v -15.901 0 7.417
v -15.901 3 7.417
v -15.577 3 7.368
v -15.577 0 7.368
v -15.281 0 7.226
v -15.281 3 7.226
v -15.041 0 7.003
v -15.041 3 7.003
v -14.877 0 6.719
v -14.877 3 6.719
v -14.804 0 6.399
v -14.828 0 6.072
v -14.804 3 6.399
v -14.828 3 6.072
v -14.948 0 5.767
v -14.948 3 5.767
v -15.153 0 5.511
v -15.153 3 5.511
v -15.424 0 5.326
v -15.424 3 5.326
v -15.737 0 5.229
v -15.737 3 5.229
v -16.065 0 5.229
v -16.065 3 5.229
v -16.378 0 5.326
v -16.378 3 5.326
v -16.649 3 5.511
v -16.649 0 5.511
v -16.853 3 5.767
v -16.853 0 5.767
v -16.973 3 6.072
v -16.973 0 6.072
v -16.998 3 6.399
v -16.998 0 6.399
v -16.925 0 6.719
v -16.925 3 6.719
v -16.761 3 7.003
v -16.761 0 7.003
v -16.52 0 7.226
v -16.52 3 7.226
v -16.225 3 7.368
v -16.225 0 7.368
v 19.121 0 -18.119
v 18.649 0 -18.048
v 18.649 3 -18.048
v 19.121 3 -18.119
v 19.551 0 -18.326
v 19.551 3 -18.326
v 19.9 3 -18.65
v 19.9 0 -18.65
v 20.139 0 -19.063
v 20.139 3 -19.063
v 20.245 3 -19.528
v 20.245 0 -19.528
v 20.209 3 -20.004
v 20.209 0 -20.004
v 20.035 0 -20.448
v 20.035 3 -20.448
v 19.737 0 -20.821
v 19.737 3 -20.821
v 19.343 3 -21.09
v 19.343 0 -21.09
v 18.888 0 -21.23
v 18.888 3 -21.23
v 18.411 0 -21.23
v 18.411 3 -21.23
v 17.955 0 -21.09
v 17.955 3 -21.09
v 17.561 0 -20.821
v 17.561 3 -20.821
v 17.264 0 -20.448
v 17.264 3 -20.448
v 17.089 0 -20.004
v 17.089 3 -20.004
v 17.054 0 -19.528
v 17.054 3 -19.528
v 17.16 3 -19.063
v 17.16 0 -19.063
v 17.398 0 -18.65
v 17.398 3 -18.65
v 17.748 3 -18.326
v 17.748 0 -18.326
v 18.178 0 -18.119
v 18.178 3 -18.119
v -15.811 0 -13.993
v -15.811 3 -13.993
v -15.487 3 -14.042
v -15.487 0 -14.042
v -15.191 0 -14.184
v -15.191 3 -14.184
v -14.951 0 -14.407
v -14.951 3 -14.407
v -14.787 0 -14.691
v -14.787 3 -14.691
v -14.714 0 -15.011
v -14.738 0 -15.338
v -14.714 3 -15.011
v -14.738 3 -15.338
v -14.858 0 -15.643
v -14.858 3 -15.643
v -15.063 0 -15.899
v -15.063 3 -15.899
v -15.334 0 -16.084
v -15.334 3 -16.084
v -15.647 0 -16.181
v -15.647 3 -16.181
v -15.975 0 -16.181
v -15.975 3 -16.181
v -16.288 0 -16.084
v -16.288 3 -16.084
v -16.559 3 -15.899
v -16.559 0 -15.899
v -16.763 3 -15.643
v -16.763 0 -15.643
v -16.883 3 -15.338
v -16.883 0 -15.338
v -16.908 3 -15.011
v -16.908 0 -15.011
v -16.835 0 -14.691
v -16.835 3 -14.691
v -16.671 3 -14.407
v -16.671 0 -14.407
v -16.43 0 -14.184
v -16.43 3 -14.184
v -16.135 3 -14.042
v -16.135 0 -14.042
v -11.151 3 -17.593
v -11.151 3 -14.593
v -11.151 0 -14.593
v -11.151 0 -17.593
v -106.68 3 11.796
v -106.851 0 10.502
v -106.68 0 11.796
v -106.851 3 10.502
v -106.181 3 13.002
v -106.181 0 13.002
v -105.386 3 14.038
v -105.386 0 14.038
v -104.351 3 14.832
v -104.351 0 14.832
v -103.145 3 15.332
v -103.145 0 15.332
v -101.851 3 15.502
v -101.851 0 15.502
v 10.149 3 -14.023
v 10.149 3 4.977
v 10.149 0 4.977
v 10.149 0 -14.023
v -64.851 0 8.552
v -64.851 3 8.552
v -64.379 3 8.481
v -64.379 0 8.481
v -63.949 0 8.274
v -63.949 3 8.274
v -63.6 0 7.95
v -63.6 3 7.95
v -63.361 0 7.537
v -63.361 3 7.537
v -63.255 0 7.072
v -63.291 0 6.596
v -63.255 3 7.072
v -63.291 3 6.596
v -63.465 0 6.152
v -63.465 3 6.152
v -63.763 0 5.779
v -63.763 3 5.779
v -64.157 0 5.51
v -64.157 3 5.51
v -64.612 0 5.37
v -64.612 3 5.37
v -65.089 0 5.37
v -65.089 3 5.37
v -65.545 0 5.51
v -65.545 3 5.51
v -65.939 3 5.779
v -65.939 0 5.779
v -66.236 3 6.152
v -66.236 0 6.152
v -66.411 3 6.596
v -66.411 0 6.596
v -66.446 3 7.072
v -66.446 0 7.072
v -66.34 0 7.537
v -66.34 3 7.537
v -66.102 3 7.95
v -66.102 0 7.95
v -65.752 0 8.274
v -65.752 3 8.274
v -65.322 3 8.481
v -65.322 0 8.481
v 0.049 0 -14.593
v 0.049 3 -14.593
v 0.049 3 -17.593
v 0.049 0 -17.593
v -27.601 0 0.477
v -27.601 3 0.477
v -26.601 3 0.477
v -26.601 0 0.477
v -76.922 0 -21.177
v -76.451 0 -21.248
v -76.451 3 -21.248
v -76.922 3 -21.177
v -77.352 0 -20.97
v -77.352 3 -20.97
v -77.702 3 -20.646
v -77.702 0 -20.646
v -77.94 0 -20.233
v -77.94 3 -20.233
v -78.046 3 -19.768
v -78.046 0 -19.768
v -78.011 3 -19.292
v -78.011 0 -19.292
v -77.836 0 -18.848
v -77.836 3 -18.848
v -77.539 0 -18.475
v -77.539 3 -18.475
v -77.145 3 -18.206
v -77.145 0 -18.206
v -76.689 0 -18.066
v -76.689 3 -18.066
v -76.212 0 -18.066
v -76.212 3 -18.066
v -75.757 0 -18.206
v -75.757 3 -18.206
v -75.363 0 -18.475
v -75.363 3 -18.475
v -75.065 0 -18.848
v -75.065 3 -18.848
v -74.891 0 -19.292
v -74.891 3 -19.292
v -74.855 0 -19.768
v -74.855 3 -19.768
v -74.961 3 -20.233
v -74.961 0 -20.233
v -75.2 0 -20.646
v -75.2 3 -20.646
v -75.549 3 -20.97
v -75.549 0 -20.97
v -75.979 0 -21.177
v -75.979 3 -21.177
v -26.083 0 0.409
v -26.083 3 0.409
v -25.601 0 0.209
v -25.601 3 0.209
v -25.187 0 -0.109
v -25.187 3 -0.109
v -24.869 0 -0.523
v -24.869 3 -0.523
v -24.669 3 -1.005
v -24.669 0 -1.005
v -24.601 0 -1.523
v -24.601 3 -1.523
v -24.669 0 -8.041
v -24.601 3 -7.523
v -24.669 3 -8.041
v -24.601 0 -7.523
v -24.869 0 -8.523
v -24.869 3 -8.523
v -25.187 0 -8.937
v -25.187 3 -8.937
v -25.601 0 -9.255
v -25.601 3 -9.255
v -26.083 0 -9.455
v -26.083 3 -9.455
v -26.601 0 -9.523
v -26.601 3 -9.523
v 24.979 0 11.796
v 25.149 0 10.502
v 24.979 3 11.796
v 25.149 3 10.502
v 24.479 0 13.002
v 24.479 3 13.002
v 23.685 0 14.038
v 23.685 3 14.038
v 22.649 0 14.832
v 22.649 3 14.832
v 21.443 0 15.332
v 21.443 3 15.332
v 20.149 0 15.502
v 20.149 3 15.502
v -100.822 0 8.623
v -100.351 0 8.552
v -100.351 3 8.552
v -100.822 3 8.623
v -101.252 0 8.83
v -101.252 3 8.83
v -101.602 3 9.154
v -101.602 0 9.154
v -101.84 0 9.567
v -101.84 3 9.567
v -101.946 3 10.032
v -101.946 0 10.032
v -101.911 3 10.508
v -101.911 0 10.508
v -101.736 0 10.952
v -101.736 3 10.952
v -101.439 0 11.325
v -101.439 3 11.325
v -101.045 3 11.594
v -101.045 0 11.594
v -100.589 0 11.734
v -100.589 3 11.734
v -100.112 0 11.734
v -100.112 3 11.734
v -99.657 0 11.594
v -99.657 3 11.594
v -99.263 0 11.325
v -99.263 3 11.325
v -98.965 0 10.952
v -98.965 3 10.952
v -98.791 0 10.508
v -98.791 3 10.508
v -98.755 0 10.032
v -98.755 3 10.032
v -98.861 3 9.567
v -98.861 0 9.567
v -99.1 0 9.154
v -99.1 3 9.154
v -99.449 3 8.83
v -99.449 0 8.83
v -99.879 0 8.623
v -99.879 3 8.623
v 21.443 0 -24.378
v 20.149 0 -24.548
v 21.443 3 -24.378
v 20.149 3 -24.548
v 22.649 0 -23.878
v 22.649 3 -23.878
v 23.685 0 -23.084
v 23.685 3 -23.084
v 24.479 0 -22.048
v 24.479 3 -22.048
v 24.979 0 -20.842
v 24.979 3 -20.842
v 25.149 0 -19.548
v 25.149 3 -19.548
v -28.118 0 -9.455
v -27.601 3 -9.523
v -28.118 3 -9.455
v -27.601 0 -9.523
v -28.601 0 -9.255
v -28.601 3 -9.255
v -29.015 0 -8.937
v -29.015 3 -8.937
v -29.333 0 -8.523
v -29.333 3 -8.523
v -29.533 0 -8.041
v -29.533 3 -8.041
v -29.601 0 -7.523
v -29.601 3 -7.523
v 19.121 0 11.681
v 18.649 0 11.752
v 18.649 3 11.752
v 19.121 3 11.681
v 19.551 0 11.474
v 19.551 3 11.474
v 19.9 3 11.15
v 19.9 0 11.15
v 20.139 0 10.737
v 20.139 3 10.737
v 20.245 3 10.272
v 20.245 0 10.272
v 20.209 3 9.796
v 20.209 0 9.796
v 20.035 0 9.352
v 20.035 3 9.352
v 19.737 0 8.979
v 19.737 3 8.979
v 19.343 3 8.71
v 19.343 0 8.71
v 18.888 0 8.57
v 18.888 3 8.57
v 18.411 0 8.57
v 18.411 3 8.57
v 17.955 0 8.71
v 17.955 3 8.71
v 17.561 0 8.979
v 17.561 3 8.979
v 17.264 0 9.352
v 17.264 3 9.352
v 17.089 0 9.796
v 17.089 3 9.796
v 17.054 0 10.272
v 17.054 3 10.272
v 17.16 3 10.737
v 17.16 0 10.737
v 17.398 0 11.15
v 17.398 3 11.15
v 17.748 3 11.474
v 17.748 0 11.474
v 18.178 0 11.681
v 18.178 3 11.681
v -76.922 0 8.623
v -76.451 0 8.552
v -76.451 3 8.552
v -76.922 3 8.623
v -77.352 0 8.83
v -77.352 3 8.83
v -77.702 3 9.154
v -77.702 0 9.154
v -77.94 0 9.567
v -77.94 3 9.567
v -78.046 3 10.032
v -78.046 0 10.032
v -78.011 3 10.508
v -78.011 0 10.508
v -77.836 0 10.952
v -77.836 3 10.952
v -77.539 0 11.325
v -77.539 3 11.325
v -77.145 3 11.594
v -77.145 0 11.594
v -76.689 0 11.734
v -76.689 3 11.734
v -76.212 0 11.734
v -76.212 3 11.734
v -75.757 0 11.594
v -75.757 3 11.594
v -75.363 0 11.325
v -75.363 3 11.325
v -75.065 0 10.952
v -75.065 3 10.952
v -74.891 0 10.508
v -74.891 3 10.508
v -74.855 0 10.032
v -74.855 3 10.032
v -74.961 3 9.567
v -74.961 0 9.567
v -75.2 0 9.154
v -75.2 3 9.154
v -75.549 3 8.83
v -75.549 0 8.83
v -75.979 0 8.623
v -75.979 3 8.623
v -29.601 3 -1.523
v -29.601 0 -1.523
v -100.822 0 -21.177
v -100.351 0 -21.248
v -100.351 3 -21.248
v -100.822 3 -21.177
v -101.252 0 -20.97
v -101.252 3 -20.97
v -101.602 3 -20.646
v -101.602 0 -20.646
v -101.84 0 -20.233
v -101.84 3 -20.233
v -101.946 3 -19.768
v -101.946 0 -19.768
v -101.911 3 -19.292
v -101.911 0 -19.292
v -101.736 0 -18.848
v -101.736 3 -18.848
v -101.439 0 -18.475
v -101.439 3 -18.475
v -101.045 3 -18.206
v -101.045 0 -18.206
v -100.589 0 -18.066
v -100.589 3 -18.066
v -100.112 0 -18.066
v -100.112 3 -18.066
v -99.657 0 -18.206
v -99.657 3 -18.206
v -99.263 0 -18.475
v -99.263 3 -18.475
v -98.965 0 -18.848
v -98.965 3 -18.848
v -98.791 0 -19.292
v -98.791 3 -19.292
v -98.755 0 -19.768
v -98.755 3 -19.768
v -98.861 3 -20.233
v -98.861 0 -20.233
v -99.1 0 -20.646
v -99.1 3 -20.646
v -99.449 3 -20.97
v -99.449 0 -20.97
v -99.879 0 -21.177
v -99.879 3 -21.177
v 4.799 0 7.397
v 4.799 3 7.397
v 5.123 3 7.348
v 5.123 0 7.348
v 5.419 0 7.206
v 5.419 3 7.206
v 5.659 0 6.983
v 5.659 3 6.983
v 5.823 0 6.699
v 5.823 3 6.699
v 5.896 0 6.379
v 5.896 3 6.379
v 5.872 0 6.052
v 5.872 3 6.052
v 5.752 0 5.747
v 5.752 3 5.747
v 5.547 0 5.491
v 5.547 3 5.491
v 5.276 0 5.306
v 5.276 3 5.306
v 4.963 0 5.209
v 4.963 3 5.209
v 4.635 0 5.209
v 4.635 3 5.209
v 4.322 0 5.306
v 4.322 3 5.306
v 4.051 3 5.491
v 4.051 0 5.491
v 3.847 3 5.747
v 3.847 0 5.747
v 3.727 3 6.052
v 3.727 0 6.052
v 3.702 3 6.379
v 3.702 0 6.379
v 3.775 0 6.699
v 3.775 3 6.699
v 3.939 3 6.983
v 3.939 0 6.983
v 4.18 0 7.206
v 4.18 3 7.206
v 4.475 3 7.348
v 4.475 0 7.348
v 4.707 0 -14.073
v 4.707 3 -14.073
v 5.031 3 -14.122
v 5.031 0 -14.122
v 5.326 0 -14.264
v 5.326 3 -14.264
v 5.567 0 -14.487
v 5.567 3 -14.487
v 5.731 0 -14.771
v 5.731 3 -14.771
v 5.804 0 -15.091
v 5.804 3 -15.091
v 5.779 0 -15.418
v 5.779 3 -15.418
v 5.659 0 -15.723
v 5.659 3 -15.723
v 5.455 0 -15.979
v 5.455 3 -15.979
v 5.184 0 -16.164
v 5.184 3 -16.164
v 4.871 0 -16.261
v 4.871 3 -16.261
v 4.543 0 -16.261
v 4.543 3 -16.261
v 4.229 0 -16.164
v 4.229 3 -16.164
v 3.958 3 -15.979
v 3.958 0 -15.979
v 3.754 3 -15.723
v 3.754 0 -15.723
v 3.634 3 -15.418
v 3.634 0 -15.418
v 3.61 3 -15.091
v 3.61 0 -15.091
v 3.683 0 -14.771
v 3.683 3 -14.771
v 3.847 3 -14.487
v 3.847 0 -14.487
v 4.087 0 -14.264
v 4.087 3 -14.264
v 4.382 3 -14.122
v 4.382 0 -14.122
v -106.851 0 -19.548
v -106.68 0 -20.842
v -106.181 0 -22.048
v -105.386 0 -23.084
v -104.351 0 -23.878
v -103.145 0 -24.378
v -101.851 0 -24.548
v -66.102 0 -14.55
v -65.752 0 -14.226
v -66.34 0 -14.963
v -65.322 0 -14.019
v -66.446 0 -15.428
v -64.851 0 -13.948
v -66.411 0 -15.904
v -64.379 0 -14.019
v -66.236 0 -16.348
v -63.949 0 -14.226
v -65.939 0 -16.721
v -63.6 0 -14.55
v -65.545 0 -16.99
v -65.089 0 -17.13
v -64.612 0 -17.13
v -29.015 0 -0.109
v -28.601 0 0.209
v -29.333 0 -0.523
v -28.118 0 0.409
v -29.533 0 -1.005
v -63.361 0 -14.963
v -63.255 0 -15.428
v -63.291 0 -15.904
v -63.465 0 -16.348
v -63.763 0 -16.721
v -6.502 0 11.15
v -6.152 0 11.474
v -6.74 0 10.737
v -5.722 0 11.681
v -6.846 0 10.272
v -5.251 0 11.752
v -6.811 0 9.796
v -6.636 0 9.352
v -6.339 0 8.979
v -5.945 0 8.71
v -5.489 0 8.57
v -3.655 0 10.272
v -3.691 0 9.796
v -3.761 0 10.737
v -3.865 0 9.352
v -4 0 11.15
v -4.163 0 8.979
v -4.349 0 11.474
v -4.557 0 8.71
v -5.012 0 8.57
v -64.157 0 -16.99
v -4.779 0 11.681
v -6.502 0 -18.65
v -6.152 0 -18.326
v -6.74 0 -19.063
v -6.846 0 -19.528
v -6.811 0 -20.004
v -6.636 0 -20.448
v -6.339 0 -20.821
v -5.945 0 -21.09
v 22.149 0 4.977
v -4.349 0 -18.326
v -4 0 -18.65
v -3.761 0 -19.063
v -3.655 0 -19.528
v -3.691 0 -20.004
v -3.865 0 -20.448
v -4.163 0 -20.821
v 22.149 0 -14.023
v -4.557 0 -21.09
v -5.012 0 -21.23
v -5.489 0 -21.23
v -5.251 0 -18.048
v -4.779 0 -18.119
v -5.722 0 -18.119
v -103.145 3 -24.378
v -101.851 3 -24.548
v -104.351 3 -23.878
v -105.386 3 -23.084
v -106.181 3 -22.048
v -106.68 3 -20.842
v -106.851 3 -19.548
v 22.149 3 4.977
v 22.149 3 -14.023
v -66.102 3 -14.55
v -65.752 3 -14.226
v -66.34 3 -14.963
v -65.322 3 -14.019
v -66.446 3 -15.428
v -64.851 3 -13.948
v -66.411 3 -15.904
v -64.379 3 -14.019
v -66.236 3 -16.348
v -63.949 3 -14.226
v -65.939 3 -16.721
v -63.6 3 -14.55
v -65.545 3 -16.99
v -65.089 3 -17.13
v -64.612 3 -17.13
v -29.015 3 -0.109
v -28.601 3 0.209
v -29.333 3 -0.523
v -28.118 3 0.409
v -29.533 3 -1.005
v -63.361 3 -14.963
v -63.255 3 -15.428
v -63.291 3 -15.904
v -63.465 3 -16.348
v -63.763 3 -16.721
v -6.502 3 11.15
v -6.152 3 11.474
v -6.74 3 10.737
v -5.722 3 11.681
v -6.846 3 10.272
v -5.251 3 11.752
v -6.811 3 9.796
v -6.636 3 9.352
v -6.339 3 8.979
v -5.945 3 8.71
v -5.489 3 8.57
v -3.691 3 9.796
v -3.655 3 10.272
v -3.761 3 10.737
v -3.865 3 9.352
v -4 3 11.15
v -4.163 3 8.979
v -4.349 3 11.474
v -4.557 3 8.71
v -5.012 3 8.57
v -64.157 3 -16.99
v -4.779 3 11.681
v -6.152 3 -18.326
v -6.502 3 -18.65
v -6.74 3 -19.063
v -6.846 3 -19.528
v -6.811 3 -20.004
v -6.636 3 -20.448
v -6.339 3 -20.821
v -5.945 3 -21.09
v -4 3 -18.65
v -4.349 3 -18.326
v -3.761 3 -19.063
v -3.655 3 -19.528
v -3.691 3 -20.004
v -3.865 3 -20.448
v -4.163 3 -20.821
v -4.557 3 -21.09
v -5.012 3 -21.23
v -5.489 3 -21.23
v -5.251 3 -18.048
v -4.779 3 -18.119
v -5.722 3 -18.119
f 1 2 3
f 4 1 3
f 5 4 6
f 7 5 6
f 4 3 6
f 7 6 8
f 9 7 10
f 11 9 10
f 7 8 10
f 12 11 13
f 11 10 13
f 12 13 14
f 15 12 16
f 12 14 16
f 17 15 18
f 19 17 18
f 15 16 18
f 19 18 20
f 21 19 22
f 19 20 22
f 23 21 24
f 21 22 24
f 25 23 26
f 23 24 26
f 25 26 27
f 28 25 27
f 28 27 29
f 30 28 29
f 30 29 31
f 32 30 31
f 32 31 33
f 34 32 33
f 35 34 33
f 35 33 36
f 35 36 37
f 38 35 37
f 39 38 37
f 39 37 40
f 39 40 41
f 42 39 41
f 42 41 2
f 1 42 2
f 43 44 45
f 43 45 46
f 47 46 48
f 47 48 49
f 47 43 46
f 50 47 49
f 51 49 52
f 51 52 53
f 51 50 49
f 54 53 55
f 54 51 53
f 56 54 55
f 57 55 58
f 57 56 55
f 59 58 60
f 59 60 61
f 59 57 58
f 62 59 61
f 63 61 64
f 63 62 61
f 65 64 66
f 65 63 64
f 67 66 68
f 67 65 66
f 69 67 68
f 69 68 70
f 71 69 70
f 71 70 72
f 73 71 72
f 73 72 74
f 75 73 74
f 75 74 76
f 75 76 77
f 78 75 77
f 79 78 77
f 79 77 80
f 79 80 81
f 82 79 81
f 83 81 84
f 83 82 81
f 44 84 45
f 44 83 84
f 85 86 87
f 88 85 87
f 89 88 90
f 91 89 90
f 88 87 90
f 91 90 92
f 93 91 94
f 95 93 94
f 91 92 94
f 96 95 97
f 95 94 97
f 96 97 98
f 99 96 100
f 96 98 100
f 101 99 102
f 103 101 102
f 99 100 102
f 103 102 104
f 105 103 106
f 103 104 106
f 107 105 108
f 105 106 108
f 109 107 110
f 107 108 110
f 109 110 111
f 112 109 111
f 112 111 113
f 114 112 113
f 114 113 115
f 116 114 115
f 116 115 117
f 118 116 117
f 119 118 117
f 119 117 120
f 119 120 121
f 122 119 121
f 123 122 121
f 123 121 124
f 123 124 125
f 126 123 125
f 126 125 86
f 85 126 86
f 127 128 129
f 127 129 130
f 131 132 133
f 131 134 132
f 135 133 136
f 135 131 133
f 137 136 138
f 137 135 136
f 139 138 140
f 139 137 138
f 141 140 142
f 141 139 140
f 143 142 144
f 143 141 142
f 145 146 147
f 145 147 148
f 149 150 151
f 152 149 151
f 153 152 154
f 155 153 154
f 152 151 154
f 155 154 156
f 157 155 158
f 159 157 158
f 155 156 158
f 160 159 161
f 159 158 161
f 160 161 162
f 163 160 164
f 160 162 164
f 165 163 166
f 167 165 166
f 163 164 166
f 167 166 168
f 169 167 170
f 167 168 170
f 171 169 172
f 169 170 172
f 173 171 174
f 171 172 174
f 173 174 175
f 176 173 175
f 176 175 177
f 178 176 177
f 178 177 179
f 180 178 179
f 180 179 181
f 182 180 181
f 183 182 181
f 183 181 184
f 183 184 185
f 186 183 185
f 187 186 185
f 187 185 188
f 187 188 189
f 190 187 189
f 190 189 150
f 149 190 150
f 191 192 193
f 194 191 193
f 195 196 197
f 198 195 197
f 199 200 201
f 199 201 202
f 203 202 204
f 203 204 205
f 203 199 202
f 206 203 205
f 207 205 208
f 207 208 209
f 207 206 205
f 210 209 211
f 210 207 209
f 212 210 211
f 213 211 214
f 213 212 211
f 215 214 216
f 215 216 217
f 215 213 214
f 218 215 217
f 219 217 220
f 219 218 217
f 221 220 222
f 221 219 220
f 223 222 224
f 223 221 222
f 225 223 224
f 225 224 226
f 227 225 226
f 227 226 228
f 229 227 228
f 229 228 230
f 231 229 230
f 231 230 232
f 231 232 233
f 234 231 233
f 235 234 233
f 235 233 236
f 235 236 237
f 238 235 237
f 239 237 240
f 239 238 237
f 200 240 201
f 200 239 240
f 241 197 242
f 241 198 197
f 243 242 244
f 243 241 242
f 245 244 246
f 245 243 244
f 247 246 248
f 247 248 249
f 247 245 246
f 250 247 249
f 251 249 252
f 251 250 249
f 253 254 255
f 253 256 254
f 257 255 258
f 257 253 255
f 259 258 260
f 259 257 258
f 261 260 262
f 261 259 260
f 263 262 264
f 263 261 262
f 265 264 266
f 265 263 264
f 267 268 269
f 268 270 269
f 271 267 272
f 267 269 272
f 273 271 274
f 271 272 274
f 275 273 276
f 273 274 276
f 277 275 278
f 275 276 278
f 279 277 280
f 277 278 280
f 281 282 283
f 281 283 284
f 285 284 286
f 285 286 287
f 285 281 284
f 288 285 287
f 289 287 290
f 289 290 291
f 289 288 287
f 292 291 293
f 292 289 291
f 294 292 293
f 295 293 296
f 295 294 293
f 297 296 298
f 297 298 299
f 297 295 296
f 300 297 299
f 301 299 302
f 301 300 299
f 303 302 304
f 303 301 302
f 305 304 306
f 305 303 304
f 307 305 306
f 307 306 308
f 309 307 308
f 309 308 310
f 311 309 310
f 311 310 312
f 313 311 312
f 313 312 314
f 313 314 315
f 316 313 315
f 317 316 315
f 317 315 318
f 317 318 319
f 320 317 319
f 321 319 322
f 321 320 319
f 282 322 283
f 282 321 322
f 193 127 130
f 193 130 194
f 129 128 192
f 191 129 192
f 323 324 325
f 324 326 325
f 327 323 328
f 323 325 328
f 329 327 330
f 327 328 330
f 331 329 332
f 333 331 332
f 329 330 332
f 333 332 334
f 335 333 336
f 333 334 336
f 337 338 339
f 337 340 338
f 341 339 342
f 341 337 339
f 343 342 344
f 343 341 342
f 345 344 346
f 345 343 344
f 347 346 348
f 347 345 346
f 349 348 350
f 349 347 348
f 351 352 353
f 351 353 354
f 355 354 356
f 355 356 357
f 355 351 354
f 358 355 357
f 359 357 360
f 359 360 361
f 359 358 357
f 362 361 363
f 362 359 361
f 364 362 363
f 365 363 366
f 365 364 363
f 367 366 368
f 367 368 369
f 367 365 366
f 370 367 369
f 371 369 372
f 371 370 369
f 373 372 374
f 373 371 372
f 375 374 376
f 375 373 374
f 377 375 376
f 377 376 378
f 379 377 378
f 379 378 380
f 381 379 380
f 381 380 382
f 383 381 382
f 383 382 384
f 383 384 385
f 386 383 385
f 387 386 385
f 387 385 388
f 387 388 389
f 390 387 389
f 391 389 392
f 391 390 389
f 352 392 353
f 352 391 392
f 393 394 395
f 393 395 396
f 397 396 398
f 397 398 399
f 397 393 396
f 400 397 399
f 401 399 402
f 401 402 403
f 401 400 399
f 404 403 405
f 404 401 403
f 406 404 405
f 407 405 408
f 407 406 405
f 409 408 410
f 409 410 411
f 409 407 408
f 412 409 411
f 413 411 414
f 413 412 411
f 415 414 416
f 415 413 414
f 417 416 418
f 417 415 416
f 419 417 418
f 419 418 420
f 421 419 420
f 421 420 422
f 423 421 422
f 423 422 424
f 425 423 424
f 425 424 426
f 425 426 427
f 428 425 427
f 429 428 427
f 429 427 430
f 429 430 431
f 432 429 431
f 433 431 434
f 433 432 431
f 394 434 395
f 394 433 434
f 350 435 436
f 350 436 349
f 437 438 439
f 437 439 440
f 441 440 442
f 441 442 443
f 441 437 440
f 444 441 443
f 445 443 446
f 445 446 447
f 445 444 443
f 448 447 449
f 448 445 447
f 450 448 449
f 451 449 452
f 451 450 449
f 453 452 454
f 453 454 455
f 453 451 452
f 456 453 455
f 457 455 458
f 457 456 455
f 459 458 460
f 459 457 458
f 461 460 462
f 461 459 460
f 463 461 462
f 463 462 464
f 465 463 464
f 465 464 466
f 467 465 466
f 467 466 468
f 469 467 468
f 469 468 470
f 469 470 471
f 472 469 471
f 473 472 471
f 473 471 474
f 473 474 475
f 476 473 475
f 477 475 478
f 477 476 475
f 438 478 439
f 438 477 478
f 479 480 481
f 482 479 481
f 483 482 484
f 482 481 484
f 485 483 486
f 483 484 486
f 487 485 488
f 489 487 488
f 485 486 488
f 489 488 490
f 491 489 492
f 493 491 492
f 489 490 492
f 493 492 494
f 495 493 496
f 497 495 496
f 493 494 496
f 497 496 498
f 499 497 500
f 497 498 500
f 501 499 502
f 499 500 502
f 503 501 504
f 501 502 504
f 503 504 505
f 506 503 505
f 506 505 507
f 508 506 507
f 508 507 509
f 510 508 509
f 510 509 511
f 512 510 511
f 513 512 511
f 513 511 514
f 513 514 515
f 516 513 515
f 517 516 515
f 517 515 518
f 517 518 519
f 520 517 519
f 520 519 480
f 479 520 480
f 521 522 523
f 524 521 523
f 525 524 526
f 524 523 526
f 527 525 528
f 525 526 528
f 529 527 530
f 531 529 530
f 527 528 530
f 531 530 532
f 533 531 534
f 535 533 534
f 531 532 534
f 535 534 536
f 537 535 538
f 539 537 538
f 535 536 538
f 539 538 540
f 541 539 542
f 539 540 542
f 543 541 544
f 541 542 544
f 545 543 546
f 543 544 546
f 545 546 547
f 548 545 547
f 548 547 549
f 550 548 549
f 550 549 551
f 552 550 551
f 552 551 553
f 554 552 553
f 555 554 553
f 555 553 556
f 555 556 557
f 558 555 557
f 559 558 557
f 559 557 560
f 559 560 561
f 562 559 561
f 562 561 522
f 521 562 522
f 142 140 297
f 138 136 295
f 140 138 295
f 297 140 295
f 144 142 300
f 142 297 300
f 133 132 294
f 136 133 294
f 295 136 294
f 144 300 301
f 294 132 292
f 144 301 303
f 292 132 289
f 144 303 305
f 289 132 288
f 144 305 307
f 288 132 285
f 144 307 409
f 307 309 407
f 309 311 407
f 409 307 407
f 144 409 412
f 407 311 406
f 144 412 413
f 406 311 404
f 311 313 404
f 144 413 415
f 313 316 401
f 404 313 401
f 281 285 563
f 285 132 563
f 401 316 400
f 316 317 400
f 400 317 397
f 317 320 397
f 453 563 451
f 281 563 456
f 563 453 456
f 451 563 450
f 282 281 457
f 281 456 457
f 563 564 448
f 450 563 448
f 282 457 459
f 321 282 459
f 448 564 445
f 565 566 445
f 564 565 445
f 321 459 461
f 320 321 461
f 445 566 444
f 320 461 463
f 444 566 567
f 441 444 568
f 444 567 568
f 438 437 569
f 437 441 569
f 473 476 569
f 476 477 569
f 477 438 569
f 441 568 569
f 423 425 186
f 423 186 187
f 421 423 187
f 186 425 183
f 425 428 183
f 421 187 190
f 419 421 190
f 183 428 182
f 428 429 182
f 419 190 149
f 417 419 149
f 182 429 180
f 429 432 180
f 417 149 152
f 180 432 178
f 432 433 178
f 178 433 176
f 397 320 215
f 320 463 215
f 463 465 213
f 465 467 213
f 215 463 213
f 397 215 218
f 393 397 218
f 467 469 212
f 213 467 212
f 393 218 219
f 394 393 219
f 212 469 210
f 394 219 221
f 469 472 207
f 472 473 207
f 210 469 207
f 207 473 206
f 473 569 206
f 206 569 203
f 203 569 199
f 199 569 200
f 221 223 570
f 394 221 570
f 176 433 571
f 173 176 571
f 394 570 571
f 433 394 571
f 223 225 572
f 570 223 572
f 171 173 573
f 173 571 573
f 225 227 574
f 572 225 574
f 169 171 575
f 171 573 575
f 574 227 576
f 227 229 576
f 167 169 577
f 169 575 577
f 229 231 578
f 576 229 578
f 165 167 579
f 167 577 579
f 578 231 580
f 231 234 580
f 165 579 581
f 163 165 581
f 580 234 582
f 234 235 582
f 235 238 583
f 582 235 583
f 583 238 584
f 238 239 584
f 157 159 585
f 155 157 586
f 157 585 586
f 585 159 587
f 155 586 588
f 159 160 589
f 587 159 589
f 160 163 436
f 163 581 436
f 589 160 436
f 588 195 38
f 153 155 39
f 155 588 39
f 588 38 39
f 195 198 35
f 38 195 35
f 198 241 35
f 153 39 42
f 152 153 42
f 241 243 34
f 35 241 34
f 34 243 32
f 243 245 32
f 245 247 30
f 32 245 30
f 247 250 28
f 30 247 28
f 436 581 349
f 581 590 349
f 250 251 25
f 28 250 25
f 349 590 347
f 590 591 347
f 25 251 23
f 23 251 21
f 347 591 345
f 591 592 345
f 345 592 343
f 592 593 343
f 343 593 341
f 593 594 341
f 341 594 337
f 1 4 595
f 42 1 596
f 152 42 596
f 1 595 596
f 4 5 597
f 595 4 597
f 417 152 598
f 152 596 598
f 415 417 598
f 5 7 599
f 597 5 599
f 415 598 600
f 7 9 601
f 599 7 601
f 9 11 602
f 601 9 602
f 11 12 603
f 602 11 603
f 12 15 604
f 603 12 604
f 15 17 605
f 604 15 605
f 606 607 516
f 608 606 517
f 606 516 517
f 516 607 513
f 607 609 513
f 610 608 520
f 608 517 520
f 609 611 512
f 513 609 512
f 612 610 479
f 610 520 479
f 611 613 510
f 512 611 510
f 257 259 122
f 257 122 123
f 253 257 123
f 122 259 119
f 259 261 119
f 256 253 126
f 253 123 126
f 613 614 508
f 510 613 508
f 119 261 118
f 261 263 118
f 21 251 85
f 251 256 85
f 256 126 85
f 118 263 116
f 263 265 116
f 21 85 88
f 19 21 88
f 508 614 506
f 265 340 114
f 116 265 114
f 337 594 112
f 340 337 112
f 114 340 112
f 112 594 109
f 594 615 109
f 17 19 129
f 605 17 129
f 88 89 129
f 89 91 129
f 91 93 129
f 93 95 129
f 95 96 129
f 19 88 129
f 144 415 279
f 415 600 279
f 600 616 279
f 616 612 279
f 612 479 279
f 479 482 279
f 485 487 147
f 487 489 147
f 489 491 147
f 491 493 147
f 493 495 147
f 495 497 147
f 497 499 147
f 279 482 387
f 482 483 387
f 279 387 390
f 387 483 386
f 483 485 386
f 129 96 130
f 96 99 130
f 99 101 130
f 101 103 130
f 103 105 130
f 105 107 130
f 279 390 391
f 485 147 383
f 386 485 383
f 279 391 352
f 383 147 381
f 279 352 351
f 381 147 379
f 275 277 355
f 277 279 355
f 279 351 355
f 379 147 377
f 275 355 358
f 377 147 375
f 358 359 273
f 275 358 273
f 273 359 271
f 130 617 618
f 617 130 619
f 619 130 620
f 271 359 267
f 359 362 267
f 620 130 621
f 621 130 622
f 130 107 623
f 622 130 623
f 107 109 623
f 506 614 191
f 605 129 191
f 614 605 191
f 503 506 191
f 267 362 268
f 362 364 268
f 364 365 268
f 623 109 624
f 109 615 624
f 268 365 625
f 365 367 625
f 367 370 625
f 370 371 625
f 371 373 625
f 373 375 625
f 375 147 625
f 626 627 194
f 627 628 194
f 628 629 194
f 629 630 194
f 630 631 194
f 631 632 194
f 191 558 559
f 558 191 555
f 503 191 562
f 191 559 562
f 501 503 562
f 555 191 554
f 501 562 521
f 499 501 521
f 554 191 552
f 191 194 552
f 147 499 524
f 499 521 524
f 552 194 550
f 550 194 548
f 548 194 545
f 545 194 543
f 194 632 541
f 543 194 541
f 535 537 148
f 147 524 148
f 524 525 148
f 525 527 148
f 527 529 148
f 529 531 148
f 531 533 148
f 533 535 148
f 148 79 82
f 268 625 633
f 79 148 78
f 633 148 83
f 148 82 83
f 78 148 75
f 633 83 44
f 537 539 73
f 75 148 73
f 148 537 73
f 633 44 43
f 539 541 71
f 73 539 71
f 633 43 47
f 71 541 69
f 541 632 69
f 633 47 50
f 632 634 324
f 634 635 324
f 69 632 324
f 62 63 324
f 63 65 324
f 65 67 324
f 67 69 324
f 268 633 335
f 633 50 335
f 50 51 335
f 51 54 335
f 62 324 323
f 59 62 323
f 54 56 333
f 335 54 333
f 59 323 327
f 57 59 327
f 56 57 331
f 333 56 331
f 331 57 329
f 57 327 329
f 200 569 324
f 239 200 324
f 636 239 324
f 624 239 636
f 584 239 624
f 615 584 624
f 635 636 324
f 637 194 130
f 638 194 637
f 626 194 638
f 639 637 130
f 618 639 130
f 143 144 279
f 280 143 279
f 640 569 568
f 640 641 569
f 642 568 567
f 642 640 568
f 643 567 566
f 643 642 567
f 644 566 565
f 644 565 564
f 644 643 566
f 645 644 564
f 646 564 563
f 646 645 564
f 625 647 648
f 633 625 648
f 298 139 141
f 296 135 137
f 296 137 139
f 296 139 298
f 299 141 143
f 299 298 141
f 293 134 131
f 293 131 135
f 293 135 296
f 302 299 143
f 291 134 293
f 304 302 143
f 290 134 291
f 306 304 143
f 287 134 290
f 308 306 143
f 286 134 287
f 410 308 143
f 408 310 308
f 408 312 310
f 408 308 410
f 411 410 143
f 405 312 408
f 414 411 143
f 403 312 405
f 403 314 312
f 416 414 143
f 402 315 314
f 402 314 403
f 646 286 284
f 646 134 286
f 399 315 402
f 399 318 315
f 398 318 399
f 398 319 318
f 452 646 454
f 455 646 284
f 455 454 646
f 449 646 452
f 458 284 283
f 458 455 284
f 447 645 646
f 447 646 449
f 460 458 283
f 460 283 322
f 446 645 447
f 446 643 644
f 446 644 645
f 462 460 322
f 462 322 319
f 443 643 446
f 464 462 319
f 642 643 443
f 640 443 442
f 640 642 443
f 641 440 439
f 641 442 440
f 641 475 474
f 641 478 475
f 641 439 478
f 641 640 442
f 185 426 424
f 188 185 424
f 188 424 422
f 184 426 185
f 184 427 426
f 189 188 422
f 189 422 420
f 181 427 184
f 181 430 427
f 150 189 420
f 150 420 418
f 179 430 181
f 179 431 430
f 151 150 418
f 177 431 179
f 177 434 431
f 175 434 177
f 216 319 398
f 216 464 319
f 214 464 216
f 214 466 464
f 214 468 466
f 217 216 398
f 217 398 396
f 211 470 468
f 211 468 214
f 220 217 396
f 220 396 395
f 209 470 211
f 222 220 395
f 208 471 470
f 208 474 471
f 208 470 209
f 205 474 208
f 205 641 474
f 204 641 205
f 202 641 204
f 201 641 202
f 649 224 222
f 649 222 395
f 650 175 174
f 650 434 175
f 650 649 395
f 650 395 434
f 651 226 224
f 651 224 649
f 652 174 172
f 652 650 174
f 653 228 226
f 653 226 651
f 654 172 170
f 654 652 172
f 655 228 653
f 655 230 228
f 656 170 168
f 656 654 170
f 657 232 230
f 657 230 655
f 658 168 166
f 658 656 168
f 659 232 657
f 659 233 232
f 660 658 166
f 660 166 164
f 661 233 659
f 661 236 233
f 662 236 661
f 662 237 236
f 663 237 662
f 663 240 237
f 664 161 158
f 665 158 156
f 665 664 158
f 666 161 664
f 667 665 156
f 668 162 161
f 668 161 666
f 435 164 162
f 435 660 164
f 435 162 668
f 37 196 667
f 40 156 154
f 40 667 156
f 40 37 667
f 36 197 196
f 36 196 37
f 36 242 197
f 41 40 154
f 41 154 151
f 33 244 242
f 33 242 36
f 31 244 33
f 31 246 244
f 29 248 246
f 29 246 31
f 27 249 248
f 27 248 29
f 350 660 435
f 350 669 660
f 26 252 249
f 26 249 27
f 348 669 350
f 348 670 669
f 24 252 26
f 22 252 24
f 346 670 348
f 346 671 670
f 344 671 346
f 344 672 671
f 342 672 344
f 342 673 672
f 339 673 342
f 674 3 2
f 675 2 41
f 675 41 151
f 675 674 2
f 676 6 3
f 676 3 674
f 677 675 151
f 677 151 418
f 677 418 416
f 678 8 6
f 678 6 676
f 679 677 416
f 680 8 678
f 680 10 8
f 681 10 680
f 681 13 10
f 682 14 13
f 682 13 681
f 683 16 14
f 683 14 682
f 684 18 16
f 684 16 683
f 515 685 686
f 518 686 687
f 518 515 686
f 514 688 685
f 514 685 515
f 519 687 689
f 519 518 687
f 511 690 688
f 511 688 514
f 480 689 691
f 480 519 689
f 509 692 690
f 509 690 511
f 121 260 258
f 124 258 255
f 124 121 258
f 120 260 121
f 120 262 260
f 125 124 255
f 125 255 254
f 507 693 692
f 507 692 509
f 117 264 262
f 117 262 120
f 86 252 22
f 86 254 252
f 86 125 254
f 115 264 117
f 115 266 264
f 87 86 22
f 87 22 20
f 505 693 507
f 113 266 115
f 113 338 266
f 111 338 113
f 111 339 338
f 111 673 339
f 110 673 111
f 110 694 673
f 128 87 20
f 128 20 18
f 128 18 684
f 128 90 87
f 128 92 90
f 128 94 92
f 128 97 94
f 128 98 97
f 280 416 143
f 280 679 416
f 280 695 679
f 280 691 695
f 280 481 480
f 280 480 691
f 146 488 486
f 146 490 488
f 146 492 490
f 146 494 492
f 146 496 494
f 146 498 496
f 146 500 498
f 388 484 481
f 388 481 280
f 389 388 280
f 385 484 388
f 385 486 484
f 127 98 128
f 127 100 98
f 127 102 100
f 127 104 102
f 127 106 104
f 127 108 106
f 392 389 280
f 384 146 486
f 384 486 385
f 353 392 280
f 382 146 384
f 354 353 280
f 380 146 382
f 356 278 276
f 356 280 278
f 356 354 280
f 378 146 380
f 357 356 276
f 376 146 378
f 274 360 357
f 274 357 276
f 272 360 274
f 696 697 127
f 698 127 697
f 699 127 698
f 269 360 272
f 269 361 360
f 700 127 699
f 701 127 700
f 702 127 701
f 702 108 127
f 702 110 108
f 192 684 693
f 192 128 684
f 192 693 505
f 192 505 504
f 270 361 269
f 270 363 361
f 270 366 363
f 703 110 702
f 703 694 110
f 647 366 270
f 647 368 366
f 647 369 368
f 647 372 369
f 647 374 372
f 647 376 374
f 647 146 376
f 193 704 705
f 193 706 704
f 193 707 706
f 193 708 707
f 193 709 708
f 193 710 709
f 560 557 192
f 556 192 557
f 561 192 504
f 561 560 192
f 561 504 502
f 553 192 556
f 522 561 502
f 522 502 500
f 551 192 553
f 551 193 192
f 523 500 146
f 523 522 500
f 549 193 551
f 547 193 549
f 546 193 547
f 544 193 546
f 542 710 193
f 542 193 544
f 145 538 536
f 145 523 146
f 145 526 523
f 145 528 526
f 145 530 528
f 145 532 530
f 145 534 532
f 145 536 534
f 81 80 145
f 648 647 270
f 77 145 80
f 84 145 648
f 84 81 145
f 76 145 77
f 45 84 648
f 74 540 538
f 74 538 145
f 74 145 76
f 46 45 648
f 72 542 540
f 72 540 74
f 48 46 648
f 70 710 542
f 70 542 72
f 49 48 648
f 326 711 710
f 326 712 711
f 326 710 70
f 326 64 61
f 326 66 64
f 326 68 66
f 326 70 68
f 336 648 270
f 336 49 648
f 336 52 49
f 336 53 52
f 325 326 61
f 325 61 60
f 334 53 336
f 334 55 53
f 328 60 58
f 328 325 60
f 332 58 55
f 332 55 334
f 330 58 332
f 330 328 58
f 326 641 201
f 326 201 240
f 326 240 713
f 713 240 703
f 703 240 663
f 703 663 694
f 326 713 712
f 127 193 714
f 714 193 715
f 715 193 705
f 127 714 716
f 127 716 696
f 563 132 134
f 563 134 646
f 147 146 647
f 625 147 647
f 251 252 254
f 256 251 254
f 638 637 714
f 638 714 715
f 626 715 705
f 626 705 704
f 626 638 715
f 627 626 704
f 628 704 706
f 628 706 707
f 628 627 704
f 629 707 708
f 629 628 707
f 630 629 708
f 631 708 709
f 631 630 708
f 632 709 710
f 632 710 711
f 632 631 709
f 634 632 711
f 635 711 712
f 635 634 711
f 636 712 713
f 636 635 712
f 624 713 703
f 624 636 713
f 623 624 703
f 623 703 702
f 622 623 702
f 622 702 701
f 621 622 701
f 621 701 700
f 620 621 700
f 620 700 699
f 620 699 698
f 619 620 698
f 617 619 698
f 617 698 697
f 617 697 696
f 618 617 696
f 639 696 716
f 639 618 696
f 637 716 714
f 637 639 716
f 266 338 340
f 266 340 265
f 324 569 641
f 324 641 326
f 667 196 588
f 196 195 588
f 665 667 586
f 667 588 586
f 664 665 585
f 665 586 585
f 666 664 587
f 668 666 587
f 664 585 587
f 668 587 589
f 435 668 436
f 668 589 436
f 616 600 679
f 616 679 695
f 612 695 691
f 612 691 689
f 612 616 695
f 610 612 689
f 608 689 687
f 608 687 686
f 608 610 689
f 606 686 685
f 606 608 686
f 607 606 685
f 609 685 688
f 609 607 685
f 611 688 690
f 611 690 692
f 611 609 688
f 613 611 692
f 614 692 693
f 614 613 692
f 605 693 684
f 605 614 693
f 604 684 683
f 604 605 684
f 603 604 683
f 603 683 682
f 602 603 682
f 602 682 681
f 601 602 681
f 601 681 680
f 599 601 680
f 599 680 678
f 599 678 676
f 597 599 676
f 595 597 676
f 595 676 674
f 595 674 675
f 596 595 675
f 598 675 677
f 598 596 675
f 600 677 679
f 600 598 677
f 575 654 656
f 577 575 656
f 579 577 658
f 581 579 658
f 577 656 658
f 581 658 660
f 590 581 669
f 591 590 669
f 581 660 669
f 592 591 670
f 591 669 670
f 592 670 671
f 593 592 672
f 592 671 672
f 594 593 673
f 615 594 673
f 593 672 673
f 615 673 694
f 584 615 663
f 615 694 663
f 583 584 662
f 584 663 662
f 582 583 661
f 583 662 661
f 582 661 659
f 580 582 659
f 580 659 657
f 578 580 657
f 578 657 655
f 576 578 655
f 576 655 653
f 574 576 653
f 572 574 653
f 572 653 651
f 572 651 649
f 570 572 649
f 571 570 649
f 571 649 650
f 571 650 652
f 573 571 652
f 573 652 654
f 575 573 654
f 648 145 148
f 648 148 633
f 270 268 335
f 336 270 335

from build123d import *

# Parameters (mm, degrees)
SKETCH_1_W          = 132
SKETCH_1_H          = 40.05
SKETCH_1_R          = 1.6
EXTRUDE_1_DEPTH     = 3
FILLET_1_R          = 5
FILLET_2_R          = 5
SKETCH_4_R          = 1.1
SKETCH_4_W          = 12
SKETCH_4_H          = 19
SKETCH_4_W_2        = 11.2
SKETCH_4_H_2        = 3
CUT_EXTRUDE_1_DEPTH = 10
SKETCH_5_R          = 1.6
SKETCH_5_W          = 5
SKETCH_5_H          = 10
CUT_EXTRUDE_2_DEPTH = 10
FILLET_3_R          = 2


with BuildPart() as part:
    # 草图1 → 凸台-拉伸1 (new body)
    with BuildSketch(Plane(origin=(0, 0, 0), x_dir=(1, 0, 0), z_dir=(0, 1, 0))):
        with Locations((-40.850806452, 4.522983871)):
            Rectangle(SKETCH_1_W, SKETCH_1_H)
        with Locations(Location((18.649193548, 19.647983871, 0), (0, 0, 270))):
            Circle(SKETCH_1_R, mode=Mode.SUBTRACT)
        with Locations(Location((18.649193548, -10.152016129, 0), (0, 0, 270))):
            Circle(SKETCH_1_R, mode=Mode.SUBTRACT)
        with Locations(Location((-5.250806452, 19.647983871, 0), (0, 0, 270))):
            Circle(SKETCH_1_R, mode=Mode.SUBTRACT)
        with Locations(Location((-5.250806452, -10.152016129, 0), (0, 0, 270))):
            Circle(SKETCH_1_R, mode=Mode.SUBTRACT)
        with Locations(Location((-100.350806452, -10.152016129, 0), (0, 0, 90))):
            Circle(SKETCH_1_R, mode=Mode.SUBTRACT)
        with Locations(Location((-76.450806452, -10.152016129, 0), (0, 0, 90))):
            Circle(SKETCH_1_R, mode=Mode.SUBTRACT)
        with Locations(Location((-100.350806452, 19.647983871, 0), (0, 0, 90))):
            Circle(SKETCH_1_R, mode=Mode.SUBTRACT)
        with Locations(Location((-76.450806452, 19.647983871, 0), (0, 0, 90))):
            Circle(SKETCH_1_R, mode=Mode.SUBTRACT)
    extrude(amount=EXTRUDE_1_DEPTH)

    # 圆角1
    fillet_1_edges = [part.edges().sort_by_distance(p)[0] for p in [
        (25.149193548, 1.5, -24.547983871),
    ]]
    fillet(fillet_1_edges, radius=FILLET_1_R)

    # 圆角2
    fillet_2_edges = [part.edges().sort_by_distance(p)[0] for p in [
        (25.149193548, 1.5, 15.502016129),
        (-106.850806452, 1.5, 15.502016129),
        (-106.850806452, 1.5, -24.547983871),
    ]]
    fillet(fillet_2_edges, radius=FILLET_2_R)

    # 草图4 → 切除-拉伸1 (cut)
    with BuildSketch(Plane(origin=(0, 3, 0), x_dir=(1, 0, 0), z_dir=(0, 1, 0))):
        with Locations(Location((4.70662119, 15.172983871, 0), (0, 0, 270))):
            Circle(SKETCH_4_R)
        with Locations(Location((4.799193548, -6.297016129, 0), (0, 0, 270))):
            Circle(SKETCH_4_R)
        with Locations(Location((-15.810806452, 15.092983871, 0), (0, 0, 270))):
            Circle(SKETCH_4_R)
        with Locations(Location((-15.900806452, -6.317016129, 0), (0, 0, 270))):
            Circle(SKETCH_4_R)
        with Locations((16.149193548, 4.522983871)):
            Rectangle(SKETCH_4_W, SKETCH_4_H)
        with Locations((-5.550806452, 16.092983871)):
            Rectangle(SKETCH_4_W_2, SKETCH_4_H_2)
    extrude(amount=-CUT_EXTRUDE_1_DEPTH, mode=Mode.SUBTRACT)

    # 草图5 → 切除-拉伸2 (cut)
    with BuildSketch(Plane(origin=(0, 3, 0), x_dir=(1, 0, 0), z_dir=(0, 1, 0))):
        with Locations(Location((-64.850806452, 15.547983871, 0), (0, 0, 270))):
            Circle(SKETCH_5_R)
        with Locations(Location((-64.850806452, -6.952016129, 0), (0, 0, 270))):
            Circle(SKETCH_5_R)
        with Locations((-27.100806452, 4.522983871)):
            Rectangle(SKETCH_5_W, SKETCH_5_H)
    extrude(amount=-CUT_EXTRUDE_2_DEPTH, mode=Mode.SUBTRACT)

    # 圆角3
    fillet_3_edges = [part.edges().sort_by_distance(p)[0] for p in [
        (-24.600806452, 1.5, 0.477016129),
        (-29.600806452, 1.5, 0.477016129),
        (-29.600806452, 1.5, -9.522983871),
        (-24.600806452, 1.5, -9.522983871),
    ]]
    fillet(fillet_3_edges, radius=FILLET_3_R)


solid = part.part
